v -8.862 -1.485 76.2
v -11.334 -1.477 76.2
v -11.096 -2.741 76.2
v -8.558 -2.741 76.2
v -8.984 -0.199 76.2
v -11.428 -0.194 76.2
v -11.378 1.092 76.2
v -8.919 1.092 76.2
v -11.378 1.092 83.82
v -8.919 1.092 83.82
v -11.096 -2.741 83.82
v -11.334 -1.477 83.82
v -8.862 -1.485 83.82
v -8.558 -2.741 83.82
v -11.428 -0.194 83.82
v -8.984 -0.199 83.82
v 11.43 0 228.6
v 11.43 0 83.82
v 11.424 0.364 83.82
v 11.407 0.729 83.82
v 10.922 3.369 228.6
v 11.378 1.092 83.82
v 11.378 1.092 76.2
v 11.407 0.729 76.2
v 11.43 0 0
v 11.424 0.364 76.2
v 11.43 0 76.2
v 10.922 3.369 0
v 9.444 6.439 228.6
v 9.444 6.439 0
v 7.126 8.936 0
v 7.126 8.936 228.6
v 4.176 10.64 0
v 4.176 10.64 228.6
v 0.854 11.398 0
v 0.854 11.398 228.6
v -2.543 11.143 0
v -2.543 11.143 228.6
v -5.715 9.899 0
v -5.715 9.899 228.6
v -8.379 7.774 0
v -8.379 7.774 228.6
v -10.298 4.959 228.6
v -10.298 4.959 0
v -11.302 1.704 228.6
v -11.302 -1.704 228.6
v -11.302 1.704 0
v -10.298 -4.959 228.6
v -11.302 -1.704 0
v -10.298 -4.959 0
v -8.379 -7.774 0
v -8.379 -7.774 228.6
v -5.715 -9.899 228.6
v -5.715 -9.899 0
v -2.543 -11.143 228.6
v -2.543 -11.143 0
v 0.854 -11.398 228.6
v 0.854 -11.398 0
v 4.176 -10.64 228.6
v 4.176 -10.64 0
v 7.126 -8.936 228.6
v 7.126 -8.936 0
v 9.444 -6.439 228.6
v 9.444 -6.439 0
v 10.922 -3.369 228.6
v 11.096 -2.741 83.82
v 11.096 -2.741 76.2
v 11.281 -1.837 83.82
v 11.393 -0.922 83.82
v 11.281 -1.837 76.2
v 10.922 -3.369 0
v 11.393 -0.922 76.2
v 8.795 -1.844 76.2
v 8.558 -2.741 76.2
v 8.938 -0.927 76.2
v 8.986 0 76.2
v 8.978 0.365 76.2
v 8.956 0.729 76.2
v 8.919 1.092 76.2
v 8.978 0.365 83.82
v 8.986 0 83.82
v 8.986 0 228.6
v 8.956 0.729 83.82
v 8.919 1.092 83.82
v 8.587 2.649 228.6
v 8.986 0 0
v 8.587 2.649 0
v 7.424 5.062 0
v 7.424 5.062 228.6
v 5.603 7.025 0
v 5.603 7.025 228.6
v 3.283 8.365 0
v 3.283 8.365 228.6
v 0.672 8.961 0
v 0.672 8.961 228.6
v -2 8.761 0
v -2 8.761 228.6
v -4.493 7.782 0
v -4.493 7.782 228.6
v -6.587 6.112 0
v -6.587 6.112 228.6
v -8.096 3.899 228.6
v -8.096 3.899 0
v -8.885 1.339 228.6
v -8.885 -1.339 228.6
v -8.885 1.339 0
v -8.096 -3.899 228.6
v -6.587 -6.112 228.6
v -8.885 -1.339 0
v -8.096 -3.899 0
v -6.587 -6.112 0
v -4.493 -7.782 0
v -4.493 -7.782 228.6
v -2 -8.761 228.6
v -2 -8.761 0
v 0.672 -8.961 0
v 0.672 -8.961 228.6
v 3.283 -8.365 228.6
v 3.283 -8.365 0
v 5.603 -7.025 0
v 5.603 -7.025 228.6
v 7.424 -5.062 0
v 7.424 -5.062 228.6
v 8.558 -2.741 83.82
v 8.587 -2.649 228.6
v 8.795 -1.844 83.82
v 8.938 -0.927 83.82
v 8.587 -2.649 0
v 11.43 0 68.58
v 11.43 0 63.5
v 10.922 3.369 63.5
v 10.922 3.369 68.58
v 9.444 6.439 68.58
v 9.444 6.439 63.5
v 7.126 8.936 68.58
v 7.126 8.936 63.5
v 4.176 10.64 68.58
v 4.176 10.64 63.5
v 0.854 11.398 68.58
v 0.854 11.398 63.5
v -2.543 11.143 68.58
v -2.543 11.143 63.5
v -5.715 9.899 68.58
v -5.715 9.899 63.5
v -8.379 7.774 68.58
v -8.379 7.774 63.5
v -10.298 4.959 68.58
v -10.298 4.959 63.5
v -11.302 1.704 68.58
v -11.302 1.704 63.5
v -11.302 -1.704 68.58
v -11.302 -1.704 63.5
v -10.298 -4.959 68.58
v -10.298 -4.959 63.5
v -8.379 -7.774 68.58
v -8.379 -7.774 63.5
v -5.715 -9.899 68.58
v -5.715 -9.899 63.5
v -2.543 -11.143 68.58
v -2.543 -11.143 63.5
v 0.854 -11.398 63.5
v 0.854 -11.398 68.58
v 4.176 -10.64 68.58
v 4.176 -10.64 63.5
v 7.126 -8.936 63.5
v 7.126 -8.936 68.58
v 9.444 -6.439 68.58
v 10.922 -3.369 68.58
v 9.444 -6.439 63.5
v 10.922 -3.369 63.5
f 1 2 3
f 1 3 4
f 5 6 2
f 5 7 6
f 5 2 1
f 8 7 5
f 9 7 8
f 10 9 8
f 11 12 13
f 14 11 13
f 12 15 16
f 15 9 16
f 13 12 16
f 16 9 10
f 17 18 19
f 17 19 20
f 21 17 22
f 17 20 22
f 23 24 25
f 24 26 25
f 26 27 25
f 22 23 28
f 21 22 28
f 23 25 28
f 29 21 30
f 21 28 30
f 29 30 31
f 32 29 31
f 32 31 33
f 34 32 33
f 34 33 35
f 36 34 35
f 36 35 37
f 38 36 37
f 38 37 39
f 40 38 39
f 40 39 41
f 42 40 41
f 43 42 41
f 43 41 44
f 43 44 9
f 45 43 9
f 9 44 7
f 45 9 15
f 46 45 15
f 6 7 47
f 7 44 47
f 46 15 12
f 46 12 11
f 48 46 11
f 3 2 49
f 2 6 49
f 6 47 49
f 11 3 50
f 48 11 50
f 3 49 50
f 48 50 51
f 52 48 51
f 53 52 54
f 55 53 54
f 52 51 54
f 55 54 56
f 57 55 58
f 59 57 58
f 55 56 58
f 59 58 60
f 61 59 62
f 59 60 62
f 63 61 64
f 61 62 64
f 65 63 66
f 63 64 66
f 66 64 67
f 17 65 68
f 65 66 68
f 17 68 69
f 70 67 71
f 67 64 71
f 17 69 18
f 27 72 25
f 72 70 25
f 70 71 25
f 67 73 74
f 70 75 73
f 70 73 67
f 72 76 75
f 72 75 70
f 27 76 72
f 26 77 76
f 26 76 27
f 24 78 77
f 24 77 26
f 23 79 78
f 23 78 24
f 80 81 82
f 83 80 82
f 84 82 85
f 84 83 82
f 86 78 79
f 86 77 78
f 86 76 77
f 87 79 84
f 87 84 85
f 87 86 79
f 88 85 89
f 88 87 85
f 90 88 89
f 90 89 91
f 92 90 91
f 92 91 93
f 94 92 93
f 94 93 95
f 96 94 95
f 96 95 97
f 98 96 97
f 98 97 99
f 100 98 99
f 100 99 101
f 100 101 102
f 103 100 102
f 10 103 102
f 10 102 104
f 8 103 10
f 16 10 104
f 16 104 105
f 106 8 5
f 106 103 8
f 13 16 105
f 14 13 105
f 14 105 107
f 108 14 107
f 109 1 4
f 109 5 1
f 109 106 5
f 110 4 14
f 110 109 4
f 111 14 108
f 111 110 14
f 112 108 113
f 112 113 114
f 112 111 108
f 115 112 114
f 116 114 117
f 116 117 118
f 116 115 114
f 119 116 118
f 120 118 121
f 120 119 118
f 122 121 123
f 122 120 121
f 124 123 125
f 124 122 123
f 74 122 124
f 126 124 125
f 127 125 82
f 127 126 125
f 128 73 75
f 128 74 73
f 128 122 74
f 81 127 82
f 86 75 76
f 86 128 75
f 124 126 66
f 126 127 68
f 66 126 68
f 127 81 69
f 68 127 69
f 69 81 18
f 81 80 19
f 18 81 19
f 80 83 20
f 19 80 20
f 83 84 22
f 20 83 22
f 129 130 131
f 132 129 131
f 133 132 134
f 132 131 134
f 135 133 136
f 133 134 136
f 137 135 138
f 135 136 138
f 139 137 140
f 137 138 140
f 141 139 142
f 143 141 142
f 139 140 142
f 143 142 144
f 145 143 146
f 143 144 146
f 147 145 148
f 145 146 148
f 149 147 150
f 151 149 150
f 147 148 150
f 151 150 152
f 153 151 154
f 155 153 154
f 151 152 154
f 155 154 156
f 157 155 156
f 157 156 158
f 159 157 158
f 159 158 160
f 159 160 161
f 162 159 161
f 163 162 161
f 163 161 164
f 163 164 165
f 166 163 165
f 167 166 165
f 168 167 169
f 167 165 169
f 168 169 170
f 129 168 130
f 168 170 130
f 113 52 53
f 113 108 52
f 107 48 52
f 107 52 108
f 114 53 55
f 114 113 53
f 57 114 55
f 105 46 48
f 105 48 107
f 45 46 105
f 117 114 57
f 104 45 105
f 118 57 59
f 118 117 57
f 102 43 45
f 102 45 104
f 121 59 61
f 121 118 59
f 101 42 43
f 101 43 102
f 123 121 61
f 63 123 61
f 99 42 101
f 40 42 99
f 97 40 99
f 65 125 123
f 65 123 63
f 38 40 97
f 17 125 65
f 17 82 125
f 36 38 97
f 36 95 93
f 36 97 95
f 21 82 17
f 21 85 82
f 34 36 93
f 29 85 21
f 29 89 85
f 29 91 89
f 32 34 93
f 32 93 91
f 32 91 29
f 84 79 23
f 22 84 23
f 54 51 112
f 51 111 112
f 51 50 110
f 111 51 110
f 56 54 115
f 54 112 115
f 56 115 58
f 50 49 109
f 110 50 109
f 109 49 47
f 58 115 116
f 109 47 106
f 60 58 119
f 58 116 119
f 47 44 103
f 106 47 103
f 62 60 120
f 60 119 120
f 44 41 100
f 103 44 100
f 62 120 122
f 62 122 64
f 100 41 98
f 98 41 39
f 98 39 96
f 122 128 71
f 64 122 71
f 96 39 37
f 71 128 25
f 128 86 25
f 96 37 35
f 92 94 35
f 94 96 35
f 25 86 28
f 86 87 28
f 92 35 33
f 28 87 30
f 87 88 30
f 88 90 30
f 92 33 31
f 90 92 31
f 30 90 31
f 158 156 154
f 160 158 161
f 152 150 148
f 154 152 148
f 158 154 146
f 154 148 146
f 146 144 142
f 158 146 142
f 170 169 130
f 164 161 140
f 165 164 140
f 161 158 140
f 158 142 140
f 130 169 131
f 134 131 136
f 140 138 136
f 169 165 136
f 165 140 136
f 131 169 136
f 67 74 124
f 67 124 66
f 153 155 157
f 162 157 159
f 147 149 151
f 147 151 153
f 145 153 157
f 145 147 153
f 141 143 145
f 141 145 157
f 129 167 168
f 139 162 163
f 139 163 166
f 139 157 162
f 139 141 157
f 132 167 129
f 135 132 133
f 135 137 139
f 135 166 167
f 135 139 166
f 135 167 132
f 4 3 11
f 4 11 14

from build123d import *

# Parameters (mm, degrees)
F0_R     = 11.43
F0_R_2   = 8.98586
F1_DEPTH = 228.6
F3_W     = 28.714685
F3_H     = 3.832995
F4_DEPTH = 7.62
F6_R     = 11.43
F7_DEPTH = 5.08


with BuildPart() as f1:
    # F0 (on Top) → F1 (new body)
    with BuildSketch(Plane.XY):
        Circle(F0_R)
        Circle(F0_R_2, mode=Mode.SUBTRACT)
    extrude(amount=F1_DEPTH)

    # F3 (on offset) → F4 (cut)
    with BuildSketch(Plane.XY.offset(76.2)):
        with Locations((0.406578, -0.824531)):
            Rectangle(F3_W, F3_H)
    extrude(amount=F4_DEPTH, mode=Mode.SUBTRACT)


with BuildPart() as f7:
    # F6 (on offset) → F7 (new body)
    with BuildSketch(Plane.XY.offset(63.5)):
        Circle(F6_R)
    extrude(amount=F7_DEPTH)


solid = Compound([f1.part, f7.part])
